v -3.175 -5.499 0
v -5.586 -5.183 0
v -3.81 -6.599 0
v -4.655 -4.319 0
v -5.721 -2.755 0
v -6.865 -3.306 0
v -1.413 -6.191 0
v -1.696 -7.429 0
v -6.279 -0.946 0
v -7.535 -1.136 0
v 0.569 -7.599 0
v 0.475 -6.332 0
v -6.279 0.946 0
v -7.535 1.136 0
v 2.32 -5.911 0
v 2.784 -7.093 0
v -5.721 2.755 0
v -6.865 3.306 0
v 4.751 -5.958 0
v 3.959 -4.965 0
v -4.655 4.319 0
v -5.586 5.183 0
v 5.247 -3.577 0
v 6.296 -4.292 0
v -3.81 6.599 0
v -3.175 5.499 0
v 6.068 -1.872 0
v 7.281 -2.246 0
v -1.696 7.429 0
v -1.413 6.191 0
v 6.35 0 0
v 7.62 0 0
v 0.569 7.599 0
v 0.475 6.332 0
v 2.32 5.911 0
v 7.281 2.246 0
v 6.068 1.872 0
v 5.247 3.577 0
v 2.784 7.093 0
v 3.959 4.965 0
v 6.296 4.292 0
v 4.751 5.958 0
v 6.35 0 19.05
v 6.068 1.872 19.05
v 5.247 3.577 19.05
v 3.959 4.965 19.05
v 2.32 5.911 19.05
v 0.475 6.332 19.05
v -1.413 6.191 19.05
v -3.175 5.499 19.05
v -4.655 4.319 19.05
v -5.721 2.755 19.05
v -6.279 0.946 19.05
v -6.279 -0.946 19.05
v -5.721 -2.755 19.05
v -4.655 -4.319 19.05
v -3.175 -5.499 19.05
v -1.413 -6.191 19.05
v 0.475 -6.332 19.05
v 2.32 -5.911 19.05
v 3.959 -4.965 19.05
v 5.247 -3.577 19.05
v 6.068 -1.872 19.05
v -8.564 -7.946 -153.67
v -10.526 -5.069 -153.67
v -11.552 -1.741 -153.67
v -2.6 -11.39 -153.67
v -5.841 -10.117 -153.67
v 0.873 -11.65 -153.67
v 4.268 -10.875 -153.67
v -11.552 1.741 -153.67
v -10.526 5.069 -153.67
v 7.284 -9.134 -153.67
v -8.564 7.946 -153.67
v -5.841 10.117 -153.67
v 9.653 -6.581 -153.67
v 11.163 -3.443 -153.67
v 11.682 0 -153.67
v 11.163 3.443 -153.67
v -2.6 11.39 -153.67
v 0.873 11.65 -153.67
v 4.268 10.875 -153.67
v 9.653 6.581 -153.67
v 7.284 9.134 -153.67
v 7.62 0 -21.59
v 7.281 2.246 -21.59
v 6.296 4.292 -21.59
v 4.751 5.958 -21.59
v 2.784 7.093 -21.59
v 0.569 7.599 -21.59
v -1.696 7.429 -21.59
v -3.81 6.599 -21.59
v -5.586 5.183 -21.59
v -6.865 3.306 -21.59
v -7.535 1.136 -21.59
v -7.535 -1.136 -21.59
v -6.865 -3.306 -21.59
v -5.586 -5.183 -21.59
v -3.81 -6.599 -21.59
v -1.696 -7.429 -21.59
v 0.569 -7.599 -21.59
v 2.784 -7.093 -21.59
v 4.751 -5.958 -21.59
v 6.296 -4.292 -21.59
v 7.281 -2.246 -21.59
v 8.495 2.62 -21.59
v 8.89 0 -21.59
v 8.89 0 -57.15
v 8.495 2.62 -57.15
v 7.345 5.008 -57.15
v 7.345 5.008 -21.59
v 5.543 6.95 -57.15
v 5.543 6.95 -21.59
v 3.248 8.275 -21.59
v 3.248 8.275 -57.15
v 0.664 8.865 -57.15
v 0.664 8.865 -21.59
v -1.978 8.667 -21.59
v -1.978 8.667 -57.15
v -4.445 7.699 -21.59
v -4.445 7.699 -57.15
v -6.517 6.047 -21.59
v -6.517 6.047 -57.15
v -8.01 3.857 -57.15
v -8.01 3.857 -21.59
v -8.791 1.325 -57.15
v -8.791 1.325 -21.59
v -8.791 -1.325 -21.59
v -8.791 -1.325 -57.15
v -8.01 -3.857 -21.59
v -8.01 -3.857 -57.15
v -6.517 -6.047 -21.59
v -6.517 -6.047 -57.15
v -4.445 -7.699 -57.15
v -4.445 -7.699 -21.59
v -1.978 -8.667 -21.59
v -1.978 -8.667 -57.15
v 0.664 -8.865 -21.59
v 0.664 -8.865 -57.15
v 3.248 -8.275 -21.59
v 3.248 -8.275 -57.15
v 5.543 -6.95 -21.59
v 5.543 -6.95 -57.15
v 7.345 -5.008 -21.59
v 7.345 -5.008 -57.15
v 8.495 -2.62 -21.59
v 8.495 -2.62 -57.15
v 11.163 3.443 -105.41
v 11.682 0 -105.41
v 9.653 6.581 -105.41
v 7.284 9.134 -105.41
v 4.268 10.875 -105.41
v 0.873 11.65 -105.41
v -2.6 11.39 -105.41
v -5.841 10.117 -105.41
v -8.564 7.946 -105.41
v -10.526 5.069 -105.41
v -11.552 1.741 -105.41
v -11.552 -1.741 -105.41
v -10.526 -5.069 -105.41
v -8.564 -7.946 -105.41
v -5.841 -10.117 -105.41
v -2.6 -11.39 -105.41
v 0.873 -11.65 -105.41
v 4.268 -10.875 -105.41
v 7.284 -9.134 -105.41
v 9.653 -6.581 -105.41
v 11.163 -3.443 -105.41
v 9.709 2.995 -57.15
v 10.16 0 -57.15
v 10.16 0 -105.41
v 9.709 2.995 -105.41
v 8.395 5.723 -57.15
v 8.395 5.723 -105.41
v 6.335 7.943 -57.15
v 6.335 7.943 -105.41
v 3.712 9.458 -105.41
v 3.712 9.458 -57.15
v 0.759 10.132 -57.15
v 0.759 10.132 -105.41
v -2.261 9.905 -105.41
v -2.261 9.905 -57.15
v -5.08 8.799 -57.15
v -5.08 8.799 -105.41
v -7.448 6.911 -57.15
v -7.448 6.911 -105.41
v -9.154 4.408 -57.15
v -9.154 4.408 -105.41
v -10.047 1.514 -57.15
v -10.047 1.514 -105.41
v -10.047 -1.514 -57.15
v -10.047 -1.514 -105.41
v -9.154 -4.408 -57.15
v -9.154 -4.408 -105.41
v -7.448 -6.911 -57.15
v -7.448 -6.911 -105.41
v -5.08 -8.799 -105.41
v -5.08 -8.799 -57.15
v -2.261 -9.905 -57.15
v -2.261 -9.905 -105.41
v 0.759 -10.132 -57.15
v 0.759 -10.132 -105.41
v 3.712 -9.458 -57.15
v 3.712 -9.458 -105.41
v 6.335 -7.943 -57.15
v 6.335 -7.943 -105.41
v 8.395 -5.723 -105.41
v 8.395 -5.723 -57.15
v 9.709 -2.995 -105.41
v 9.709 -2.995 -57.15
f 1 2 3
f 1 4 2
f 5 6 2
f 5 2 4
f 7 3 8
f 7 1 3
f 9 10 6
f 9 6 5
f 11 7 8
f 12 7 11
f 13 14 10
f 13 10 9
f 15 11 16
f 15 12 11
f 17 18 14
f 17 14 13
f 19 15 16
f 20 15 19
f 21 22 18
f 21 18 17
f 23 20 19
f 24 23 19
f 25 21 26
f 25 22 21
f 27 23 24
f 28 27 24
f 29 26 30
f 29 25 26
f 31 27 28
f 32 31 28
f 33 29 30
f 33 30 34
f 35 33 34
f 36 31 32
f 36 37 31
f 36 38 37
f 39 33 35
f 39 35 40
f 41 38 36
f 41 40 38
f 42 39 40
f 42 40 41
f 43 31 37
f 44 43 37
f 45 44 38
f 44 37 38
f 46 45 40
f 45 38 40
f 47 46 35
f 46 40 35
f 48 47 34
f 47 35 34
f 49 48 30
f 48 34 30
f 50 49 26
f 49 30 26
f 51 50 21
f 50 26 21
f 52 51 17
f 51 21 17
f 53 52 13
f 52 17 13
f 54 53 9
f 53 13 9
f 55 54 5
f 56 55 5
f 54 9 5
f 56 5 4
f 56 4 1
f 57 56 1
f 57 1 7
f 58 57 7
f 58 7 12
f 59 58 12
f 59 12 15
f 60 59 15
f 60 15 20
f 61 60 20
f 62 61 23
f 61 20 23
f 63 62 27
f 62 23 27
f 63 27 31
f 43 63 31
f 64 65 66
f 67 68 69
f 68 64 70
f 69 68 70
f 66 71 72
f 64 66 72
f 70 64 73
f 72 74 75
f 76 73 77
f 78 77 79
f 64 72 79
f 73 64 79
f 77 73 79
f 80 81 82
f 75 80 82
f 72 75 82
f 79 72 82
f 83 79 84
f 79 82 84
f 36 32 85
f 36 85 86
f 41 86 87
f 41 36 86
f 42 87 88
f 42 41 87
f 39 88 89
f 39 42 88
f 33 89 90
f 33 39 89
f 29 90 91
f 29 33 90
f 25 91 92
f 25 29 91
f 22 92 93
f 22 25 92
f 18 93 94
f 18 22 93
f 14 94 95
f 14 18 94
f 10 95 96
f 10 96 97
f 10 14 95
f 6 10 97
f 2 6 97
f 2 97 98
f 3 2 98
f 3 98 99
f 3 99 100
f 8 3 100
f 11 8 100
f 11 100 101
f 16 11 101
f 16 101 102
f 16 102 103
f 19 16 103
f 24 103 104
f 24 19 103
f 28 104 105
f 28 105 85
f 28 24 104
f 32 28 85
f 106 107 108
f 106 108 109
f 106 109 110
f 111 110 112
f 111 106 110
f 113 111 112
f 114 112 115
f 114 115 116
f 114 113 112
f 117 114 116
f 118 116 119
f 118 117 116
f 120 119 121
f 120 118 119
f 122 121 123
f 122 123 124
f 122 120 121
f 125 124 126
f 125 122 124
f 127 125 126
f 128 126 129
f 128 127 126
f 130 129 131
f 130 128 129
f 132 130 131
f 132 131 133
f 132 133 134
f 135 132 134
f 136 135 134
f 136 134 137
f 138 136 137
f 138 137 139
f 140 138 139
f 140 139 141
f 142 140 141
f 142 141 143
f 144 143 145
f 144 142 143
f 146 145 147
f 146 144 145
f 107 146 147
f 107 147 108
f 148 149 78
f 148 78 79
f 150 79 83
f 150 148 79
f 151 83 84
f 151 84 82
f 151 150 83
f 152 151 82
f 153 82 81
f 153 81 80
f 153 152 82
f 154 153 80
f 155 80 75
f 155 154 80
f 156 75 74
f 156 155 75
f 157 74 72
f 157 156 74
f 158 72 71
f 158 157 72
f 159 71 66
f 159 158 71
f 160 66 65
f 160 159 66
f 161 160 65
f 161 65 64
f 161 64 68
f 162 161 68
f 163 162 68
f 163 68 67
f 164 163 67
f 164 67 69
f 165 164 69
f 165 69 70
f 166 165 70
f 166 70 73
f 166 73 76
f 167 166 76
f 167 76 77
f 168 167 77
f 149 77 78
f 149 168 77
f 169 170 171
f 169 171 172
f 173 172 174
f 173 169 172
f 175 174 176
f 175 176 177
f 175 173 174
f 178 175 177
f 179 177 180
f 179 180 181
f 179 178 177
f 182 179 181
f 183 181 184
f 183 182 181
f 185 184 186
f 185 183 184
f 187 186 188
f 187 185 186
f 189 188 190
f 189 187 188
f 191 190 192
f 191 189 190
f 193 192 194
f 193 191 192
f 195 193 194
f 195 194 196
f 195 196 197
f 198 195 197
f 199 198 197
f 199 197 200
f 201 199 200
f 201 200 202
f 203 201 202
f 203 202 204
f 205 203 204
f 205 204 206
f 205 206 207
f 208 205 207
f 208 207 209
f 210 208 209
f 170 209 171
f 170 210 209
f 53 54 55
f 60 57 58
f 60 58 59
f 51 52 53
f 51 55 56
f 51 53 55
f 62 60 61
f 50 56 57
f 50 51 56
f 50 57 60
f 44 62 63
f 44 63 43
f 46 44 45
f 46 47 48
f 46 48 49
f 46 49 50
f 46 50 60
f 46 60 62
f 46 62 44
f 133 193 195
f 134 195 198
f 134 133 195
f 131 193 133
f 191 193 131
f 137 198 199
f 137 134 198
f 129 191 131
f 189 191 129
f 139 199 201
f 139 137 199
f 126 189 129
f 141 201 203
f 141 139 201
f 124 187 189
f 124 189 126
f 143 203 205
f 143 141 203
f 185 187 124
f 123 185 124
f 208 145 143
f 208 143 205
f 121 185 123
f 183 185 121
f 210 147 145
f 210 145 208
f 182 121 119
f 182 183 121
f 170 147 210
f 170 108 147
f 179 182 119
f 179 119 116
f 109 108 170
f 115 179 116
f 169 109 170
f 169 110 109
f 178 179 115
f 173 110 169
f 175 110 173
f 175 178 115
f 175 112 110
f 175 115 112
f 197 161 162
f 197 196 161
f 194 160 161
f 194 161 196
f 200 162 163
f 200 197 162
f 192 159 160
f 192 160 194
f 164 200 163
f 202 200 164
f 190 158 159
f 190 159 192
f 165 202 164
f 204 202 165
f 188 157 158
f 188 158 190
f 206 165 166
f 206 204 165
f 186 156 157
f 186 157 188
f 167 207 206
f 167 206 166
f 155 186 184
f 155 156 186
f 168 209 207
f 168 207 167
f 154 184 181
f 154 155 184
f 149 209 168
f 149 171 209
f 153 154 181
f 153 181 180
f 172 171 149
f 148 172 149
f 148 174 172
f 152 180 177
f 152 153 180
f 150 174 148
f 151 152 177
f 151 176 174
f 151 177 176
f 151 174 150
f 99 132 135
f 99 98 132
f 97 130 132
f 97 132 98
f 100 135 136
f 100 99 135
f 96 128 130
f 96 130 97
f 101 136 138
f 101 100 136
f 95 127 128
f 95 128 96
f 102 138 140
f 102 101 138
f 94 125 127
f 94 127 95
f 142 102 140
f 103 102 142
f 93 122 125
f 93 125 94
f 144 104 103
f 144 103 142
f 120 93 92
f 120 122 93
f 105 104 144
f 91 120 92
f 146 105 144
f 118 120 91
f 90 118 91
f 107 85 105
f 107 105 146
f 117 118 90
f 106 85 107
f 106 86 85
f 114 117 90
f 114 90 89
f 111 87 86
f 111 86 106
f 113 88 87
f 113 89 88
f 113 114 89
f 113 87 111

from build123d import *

# Parameters (mm, degrees)
F0_R      = 6.35
F1_DEPTH  = 19.05
F2_R      = 7.62
F3_DEPTH  = 21.59
F5_R      = 8.89
F6_DEPTH  = 35.56
F8_R      = 10.16
F9_DEPTH  = 48.26
F11_R     = 11.682472
F12_DEPTH = 48.26


with BuildPart() as f1:
    # F0 (on Top) → F1 (new body)
    with BuildSketch(Plane.XY):
        Circle(F0_R)
    extrude(amount=F1_DEPTH)

    # F2 (on Top) → F3 (join)
    with BuildSketch(Plane.XY):
        Circle(F2_R)
    extrude(amount=-F3_DEPTH)

    # F5 (on offset) → F6 (join)
    with BuildSketch(Plane.XY.offset(-21.59)):
        Circle(F5_R)
    extrude(amount=-F6_DEPTH)

    # F8 (on offset) → F9 (join)
    with BuildSketch(Plane.XY.offset(-57.15)):
        Circle(F8_R)
    extrude(amount=-F9_DEPTH)

    # F11 (on offset) → F12 (join)
    with BuildSketch(Plane.XY.offset(-105.41)):
        Circle(F11_R)
    extrude(amount=-F12_DEPTH)


solid = f1.part
